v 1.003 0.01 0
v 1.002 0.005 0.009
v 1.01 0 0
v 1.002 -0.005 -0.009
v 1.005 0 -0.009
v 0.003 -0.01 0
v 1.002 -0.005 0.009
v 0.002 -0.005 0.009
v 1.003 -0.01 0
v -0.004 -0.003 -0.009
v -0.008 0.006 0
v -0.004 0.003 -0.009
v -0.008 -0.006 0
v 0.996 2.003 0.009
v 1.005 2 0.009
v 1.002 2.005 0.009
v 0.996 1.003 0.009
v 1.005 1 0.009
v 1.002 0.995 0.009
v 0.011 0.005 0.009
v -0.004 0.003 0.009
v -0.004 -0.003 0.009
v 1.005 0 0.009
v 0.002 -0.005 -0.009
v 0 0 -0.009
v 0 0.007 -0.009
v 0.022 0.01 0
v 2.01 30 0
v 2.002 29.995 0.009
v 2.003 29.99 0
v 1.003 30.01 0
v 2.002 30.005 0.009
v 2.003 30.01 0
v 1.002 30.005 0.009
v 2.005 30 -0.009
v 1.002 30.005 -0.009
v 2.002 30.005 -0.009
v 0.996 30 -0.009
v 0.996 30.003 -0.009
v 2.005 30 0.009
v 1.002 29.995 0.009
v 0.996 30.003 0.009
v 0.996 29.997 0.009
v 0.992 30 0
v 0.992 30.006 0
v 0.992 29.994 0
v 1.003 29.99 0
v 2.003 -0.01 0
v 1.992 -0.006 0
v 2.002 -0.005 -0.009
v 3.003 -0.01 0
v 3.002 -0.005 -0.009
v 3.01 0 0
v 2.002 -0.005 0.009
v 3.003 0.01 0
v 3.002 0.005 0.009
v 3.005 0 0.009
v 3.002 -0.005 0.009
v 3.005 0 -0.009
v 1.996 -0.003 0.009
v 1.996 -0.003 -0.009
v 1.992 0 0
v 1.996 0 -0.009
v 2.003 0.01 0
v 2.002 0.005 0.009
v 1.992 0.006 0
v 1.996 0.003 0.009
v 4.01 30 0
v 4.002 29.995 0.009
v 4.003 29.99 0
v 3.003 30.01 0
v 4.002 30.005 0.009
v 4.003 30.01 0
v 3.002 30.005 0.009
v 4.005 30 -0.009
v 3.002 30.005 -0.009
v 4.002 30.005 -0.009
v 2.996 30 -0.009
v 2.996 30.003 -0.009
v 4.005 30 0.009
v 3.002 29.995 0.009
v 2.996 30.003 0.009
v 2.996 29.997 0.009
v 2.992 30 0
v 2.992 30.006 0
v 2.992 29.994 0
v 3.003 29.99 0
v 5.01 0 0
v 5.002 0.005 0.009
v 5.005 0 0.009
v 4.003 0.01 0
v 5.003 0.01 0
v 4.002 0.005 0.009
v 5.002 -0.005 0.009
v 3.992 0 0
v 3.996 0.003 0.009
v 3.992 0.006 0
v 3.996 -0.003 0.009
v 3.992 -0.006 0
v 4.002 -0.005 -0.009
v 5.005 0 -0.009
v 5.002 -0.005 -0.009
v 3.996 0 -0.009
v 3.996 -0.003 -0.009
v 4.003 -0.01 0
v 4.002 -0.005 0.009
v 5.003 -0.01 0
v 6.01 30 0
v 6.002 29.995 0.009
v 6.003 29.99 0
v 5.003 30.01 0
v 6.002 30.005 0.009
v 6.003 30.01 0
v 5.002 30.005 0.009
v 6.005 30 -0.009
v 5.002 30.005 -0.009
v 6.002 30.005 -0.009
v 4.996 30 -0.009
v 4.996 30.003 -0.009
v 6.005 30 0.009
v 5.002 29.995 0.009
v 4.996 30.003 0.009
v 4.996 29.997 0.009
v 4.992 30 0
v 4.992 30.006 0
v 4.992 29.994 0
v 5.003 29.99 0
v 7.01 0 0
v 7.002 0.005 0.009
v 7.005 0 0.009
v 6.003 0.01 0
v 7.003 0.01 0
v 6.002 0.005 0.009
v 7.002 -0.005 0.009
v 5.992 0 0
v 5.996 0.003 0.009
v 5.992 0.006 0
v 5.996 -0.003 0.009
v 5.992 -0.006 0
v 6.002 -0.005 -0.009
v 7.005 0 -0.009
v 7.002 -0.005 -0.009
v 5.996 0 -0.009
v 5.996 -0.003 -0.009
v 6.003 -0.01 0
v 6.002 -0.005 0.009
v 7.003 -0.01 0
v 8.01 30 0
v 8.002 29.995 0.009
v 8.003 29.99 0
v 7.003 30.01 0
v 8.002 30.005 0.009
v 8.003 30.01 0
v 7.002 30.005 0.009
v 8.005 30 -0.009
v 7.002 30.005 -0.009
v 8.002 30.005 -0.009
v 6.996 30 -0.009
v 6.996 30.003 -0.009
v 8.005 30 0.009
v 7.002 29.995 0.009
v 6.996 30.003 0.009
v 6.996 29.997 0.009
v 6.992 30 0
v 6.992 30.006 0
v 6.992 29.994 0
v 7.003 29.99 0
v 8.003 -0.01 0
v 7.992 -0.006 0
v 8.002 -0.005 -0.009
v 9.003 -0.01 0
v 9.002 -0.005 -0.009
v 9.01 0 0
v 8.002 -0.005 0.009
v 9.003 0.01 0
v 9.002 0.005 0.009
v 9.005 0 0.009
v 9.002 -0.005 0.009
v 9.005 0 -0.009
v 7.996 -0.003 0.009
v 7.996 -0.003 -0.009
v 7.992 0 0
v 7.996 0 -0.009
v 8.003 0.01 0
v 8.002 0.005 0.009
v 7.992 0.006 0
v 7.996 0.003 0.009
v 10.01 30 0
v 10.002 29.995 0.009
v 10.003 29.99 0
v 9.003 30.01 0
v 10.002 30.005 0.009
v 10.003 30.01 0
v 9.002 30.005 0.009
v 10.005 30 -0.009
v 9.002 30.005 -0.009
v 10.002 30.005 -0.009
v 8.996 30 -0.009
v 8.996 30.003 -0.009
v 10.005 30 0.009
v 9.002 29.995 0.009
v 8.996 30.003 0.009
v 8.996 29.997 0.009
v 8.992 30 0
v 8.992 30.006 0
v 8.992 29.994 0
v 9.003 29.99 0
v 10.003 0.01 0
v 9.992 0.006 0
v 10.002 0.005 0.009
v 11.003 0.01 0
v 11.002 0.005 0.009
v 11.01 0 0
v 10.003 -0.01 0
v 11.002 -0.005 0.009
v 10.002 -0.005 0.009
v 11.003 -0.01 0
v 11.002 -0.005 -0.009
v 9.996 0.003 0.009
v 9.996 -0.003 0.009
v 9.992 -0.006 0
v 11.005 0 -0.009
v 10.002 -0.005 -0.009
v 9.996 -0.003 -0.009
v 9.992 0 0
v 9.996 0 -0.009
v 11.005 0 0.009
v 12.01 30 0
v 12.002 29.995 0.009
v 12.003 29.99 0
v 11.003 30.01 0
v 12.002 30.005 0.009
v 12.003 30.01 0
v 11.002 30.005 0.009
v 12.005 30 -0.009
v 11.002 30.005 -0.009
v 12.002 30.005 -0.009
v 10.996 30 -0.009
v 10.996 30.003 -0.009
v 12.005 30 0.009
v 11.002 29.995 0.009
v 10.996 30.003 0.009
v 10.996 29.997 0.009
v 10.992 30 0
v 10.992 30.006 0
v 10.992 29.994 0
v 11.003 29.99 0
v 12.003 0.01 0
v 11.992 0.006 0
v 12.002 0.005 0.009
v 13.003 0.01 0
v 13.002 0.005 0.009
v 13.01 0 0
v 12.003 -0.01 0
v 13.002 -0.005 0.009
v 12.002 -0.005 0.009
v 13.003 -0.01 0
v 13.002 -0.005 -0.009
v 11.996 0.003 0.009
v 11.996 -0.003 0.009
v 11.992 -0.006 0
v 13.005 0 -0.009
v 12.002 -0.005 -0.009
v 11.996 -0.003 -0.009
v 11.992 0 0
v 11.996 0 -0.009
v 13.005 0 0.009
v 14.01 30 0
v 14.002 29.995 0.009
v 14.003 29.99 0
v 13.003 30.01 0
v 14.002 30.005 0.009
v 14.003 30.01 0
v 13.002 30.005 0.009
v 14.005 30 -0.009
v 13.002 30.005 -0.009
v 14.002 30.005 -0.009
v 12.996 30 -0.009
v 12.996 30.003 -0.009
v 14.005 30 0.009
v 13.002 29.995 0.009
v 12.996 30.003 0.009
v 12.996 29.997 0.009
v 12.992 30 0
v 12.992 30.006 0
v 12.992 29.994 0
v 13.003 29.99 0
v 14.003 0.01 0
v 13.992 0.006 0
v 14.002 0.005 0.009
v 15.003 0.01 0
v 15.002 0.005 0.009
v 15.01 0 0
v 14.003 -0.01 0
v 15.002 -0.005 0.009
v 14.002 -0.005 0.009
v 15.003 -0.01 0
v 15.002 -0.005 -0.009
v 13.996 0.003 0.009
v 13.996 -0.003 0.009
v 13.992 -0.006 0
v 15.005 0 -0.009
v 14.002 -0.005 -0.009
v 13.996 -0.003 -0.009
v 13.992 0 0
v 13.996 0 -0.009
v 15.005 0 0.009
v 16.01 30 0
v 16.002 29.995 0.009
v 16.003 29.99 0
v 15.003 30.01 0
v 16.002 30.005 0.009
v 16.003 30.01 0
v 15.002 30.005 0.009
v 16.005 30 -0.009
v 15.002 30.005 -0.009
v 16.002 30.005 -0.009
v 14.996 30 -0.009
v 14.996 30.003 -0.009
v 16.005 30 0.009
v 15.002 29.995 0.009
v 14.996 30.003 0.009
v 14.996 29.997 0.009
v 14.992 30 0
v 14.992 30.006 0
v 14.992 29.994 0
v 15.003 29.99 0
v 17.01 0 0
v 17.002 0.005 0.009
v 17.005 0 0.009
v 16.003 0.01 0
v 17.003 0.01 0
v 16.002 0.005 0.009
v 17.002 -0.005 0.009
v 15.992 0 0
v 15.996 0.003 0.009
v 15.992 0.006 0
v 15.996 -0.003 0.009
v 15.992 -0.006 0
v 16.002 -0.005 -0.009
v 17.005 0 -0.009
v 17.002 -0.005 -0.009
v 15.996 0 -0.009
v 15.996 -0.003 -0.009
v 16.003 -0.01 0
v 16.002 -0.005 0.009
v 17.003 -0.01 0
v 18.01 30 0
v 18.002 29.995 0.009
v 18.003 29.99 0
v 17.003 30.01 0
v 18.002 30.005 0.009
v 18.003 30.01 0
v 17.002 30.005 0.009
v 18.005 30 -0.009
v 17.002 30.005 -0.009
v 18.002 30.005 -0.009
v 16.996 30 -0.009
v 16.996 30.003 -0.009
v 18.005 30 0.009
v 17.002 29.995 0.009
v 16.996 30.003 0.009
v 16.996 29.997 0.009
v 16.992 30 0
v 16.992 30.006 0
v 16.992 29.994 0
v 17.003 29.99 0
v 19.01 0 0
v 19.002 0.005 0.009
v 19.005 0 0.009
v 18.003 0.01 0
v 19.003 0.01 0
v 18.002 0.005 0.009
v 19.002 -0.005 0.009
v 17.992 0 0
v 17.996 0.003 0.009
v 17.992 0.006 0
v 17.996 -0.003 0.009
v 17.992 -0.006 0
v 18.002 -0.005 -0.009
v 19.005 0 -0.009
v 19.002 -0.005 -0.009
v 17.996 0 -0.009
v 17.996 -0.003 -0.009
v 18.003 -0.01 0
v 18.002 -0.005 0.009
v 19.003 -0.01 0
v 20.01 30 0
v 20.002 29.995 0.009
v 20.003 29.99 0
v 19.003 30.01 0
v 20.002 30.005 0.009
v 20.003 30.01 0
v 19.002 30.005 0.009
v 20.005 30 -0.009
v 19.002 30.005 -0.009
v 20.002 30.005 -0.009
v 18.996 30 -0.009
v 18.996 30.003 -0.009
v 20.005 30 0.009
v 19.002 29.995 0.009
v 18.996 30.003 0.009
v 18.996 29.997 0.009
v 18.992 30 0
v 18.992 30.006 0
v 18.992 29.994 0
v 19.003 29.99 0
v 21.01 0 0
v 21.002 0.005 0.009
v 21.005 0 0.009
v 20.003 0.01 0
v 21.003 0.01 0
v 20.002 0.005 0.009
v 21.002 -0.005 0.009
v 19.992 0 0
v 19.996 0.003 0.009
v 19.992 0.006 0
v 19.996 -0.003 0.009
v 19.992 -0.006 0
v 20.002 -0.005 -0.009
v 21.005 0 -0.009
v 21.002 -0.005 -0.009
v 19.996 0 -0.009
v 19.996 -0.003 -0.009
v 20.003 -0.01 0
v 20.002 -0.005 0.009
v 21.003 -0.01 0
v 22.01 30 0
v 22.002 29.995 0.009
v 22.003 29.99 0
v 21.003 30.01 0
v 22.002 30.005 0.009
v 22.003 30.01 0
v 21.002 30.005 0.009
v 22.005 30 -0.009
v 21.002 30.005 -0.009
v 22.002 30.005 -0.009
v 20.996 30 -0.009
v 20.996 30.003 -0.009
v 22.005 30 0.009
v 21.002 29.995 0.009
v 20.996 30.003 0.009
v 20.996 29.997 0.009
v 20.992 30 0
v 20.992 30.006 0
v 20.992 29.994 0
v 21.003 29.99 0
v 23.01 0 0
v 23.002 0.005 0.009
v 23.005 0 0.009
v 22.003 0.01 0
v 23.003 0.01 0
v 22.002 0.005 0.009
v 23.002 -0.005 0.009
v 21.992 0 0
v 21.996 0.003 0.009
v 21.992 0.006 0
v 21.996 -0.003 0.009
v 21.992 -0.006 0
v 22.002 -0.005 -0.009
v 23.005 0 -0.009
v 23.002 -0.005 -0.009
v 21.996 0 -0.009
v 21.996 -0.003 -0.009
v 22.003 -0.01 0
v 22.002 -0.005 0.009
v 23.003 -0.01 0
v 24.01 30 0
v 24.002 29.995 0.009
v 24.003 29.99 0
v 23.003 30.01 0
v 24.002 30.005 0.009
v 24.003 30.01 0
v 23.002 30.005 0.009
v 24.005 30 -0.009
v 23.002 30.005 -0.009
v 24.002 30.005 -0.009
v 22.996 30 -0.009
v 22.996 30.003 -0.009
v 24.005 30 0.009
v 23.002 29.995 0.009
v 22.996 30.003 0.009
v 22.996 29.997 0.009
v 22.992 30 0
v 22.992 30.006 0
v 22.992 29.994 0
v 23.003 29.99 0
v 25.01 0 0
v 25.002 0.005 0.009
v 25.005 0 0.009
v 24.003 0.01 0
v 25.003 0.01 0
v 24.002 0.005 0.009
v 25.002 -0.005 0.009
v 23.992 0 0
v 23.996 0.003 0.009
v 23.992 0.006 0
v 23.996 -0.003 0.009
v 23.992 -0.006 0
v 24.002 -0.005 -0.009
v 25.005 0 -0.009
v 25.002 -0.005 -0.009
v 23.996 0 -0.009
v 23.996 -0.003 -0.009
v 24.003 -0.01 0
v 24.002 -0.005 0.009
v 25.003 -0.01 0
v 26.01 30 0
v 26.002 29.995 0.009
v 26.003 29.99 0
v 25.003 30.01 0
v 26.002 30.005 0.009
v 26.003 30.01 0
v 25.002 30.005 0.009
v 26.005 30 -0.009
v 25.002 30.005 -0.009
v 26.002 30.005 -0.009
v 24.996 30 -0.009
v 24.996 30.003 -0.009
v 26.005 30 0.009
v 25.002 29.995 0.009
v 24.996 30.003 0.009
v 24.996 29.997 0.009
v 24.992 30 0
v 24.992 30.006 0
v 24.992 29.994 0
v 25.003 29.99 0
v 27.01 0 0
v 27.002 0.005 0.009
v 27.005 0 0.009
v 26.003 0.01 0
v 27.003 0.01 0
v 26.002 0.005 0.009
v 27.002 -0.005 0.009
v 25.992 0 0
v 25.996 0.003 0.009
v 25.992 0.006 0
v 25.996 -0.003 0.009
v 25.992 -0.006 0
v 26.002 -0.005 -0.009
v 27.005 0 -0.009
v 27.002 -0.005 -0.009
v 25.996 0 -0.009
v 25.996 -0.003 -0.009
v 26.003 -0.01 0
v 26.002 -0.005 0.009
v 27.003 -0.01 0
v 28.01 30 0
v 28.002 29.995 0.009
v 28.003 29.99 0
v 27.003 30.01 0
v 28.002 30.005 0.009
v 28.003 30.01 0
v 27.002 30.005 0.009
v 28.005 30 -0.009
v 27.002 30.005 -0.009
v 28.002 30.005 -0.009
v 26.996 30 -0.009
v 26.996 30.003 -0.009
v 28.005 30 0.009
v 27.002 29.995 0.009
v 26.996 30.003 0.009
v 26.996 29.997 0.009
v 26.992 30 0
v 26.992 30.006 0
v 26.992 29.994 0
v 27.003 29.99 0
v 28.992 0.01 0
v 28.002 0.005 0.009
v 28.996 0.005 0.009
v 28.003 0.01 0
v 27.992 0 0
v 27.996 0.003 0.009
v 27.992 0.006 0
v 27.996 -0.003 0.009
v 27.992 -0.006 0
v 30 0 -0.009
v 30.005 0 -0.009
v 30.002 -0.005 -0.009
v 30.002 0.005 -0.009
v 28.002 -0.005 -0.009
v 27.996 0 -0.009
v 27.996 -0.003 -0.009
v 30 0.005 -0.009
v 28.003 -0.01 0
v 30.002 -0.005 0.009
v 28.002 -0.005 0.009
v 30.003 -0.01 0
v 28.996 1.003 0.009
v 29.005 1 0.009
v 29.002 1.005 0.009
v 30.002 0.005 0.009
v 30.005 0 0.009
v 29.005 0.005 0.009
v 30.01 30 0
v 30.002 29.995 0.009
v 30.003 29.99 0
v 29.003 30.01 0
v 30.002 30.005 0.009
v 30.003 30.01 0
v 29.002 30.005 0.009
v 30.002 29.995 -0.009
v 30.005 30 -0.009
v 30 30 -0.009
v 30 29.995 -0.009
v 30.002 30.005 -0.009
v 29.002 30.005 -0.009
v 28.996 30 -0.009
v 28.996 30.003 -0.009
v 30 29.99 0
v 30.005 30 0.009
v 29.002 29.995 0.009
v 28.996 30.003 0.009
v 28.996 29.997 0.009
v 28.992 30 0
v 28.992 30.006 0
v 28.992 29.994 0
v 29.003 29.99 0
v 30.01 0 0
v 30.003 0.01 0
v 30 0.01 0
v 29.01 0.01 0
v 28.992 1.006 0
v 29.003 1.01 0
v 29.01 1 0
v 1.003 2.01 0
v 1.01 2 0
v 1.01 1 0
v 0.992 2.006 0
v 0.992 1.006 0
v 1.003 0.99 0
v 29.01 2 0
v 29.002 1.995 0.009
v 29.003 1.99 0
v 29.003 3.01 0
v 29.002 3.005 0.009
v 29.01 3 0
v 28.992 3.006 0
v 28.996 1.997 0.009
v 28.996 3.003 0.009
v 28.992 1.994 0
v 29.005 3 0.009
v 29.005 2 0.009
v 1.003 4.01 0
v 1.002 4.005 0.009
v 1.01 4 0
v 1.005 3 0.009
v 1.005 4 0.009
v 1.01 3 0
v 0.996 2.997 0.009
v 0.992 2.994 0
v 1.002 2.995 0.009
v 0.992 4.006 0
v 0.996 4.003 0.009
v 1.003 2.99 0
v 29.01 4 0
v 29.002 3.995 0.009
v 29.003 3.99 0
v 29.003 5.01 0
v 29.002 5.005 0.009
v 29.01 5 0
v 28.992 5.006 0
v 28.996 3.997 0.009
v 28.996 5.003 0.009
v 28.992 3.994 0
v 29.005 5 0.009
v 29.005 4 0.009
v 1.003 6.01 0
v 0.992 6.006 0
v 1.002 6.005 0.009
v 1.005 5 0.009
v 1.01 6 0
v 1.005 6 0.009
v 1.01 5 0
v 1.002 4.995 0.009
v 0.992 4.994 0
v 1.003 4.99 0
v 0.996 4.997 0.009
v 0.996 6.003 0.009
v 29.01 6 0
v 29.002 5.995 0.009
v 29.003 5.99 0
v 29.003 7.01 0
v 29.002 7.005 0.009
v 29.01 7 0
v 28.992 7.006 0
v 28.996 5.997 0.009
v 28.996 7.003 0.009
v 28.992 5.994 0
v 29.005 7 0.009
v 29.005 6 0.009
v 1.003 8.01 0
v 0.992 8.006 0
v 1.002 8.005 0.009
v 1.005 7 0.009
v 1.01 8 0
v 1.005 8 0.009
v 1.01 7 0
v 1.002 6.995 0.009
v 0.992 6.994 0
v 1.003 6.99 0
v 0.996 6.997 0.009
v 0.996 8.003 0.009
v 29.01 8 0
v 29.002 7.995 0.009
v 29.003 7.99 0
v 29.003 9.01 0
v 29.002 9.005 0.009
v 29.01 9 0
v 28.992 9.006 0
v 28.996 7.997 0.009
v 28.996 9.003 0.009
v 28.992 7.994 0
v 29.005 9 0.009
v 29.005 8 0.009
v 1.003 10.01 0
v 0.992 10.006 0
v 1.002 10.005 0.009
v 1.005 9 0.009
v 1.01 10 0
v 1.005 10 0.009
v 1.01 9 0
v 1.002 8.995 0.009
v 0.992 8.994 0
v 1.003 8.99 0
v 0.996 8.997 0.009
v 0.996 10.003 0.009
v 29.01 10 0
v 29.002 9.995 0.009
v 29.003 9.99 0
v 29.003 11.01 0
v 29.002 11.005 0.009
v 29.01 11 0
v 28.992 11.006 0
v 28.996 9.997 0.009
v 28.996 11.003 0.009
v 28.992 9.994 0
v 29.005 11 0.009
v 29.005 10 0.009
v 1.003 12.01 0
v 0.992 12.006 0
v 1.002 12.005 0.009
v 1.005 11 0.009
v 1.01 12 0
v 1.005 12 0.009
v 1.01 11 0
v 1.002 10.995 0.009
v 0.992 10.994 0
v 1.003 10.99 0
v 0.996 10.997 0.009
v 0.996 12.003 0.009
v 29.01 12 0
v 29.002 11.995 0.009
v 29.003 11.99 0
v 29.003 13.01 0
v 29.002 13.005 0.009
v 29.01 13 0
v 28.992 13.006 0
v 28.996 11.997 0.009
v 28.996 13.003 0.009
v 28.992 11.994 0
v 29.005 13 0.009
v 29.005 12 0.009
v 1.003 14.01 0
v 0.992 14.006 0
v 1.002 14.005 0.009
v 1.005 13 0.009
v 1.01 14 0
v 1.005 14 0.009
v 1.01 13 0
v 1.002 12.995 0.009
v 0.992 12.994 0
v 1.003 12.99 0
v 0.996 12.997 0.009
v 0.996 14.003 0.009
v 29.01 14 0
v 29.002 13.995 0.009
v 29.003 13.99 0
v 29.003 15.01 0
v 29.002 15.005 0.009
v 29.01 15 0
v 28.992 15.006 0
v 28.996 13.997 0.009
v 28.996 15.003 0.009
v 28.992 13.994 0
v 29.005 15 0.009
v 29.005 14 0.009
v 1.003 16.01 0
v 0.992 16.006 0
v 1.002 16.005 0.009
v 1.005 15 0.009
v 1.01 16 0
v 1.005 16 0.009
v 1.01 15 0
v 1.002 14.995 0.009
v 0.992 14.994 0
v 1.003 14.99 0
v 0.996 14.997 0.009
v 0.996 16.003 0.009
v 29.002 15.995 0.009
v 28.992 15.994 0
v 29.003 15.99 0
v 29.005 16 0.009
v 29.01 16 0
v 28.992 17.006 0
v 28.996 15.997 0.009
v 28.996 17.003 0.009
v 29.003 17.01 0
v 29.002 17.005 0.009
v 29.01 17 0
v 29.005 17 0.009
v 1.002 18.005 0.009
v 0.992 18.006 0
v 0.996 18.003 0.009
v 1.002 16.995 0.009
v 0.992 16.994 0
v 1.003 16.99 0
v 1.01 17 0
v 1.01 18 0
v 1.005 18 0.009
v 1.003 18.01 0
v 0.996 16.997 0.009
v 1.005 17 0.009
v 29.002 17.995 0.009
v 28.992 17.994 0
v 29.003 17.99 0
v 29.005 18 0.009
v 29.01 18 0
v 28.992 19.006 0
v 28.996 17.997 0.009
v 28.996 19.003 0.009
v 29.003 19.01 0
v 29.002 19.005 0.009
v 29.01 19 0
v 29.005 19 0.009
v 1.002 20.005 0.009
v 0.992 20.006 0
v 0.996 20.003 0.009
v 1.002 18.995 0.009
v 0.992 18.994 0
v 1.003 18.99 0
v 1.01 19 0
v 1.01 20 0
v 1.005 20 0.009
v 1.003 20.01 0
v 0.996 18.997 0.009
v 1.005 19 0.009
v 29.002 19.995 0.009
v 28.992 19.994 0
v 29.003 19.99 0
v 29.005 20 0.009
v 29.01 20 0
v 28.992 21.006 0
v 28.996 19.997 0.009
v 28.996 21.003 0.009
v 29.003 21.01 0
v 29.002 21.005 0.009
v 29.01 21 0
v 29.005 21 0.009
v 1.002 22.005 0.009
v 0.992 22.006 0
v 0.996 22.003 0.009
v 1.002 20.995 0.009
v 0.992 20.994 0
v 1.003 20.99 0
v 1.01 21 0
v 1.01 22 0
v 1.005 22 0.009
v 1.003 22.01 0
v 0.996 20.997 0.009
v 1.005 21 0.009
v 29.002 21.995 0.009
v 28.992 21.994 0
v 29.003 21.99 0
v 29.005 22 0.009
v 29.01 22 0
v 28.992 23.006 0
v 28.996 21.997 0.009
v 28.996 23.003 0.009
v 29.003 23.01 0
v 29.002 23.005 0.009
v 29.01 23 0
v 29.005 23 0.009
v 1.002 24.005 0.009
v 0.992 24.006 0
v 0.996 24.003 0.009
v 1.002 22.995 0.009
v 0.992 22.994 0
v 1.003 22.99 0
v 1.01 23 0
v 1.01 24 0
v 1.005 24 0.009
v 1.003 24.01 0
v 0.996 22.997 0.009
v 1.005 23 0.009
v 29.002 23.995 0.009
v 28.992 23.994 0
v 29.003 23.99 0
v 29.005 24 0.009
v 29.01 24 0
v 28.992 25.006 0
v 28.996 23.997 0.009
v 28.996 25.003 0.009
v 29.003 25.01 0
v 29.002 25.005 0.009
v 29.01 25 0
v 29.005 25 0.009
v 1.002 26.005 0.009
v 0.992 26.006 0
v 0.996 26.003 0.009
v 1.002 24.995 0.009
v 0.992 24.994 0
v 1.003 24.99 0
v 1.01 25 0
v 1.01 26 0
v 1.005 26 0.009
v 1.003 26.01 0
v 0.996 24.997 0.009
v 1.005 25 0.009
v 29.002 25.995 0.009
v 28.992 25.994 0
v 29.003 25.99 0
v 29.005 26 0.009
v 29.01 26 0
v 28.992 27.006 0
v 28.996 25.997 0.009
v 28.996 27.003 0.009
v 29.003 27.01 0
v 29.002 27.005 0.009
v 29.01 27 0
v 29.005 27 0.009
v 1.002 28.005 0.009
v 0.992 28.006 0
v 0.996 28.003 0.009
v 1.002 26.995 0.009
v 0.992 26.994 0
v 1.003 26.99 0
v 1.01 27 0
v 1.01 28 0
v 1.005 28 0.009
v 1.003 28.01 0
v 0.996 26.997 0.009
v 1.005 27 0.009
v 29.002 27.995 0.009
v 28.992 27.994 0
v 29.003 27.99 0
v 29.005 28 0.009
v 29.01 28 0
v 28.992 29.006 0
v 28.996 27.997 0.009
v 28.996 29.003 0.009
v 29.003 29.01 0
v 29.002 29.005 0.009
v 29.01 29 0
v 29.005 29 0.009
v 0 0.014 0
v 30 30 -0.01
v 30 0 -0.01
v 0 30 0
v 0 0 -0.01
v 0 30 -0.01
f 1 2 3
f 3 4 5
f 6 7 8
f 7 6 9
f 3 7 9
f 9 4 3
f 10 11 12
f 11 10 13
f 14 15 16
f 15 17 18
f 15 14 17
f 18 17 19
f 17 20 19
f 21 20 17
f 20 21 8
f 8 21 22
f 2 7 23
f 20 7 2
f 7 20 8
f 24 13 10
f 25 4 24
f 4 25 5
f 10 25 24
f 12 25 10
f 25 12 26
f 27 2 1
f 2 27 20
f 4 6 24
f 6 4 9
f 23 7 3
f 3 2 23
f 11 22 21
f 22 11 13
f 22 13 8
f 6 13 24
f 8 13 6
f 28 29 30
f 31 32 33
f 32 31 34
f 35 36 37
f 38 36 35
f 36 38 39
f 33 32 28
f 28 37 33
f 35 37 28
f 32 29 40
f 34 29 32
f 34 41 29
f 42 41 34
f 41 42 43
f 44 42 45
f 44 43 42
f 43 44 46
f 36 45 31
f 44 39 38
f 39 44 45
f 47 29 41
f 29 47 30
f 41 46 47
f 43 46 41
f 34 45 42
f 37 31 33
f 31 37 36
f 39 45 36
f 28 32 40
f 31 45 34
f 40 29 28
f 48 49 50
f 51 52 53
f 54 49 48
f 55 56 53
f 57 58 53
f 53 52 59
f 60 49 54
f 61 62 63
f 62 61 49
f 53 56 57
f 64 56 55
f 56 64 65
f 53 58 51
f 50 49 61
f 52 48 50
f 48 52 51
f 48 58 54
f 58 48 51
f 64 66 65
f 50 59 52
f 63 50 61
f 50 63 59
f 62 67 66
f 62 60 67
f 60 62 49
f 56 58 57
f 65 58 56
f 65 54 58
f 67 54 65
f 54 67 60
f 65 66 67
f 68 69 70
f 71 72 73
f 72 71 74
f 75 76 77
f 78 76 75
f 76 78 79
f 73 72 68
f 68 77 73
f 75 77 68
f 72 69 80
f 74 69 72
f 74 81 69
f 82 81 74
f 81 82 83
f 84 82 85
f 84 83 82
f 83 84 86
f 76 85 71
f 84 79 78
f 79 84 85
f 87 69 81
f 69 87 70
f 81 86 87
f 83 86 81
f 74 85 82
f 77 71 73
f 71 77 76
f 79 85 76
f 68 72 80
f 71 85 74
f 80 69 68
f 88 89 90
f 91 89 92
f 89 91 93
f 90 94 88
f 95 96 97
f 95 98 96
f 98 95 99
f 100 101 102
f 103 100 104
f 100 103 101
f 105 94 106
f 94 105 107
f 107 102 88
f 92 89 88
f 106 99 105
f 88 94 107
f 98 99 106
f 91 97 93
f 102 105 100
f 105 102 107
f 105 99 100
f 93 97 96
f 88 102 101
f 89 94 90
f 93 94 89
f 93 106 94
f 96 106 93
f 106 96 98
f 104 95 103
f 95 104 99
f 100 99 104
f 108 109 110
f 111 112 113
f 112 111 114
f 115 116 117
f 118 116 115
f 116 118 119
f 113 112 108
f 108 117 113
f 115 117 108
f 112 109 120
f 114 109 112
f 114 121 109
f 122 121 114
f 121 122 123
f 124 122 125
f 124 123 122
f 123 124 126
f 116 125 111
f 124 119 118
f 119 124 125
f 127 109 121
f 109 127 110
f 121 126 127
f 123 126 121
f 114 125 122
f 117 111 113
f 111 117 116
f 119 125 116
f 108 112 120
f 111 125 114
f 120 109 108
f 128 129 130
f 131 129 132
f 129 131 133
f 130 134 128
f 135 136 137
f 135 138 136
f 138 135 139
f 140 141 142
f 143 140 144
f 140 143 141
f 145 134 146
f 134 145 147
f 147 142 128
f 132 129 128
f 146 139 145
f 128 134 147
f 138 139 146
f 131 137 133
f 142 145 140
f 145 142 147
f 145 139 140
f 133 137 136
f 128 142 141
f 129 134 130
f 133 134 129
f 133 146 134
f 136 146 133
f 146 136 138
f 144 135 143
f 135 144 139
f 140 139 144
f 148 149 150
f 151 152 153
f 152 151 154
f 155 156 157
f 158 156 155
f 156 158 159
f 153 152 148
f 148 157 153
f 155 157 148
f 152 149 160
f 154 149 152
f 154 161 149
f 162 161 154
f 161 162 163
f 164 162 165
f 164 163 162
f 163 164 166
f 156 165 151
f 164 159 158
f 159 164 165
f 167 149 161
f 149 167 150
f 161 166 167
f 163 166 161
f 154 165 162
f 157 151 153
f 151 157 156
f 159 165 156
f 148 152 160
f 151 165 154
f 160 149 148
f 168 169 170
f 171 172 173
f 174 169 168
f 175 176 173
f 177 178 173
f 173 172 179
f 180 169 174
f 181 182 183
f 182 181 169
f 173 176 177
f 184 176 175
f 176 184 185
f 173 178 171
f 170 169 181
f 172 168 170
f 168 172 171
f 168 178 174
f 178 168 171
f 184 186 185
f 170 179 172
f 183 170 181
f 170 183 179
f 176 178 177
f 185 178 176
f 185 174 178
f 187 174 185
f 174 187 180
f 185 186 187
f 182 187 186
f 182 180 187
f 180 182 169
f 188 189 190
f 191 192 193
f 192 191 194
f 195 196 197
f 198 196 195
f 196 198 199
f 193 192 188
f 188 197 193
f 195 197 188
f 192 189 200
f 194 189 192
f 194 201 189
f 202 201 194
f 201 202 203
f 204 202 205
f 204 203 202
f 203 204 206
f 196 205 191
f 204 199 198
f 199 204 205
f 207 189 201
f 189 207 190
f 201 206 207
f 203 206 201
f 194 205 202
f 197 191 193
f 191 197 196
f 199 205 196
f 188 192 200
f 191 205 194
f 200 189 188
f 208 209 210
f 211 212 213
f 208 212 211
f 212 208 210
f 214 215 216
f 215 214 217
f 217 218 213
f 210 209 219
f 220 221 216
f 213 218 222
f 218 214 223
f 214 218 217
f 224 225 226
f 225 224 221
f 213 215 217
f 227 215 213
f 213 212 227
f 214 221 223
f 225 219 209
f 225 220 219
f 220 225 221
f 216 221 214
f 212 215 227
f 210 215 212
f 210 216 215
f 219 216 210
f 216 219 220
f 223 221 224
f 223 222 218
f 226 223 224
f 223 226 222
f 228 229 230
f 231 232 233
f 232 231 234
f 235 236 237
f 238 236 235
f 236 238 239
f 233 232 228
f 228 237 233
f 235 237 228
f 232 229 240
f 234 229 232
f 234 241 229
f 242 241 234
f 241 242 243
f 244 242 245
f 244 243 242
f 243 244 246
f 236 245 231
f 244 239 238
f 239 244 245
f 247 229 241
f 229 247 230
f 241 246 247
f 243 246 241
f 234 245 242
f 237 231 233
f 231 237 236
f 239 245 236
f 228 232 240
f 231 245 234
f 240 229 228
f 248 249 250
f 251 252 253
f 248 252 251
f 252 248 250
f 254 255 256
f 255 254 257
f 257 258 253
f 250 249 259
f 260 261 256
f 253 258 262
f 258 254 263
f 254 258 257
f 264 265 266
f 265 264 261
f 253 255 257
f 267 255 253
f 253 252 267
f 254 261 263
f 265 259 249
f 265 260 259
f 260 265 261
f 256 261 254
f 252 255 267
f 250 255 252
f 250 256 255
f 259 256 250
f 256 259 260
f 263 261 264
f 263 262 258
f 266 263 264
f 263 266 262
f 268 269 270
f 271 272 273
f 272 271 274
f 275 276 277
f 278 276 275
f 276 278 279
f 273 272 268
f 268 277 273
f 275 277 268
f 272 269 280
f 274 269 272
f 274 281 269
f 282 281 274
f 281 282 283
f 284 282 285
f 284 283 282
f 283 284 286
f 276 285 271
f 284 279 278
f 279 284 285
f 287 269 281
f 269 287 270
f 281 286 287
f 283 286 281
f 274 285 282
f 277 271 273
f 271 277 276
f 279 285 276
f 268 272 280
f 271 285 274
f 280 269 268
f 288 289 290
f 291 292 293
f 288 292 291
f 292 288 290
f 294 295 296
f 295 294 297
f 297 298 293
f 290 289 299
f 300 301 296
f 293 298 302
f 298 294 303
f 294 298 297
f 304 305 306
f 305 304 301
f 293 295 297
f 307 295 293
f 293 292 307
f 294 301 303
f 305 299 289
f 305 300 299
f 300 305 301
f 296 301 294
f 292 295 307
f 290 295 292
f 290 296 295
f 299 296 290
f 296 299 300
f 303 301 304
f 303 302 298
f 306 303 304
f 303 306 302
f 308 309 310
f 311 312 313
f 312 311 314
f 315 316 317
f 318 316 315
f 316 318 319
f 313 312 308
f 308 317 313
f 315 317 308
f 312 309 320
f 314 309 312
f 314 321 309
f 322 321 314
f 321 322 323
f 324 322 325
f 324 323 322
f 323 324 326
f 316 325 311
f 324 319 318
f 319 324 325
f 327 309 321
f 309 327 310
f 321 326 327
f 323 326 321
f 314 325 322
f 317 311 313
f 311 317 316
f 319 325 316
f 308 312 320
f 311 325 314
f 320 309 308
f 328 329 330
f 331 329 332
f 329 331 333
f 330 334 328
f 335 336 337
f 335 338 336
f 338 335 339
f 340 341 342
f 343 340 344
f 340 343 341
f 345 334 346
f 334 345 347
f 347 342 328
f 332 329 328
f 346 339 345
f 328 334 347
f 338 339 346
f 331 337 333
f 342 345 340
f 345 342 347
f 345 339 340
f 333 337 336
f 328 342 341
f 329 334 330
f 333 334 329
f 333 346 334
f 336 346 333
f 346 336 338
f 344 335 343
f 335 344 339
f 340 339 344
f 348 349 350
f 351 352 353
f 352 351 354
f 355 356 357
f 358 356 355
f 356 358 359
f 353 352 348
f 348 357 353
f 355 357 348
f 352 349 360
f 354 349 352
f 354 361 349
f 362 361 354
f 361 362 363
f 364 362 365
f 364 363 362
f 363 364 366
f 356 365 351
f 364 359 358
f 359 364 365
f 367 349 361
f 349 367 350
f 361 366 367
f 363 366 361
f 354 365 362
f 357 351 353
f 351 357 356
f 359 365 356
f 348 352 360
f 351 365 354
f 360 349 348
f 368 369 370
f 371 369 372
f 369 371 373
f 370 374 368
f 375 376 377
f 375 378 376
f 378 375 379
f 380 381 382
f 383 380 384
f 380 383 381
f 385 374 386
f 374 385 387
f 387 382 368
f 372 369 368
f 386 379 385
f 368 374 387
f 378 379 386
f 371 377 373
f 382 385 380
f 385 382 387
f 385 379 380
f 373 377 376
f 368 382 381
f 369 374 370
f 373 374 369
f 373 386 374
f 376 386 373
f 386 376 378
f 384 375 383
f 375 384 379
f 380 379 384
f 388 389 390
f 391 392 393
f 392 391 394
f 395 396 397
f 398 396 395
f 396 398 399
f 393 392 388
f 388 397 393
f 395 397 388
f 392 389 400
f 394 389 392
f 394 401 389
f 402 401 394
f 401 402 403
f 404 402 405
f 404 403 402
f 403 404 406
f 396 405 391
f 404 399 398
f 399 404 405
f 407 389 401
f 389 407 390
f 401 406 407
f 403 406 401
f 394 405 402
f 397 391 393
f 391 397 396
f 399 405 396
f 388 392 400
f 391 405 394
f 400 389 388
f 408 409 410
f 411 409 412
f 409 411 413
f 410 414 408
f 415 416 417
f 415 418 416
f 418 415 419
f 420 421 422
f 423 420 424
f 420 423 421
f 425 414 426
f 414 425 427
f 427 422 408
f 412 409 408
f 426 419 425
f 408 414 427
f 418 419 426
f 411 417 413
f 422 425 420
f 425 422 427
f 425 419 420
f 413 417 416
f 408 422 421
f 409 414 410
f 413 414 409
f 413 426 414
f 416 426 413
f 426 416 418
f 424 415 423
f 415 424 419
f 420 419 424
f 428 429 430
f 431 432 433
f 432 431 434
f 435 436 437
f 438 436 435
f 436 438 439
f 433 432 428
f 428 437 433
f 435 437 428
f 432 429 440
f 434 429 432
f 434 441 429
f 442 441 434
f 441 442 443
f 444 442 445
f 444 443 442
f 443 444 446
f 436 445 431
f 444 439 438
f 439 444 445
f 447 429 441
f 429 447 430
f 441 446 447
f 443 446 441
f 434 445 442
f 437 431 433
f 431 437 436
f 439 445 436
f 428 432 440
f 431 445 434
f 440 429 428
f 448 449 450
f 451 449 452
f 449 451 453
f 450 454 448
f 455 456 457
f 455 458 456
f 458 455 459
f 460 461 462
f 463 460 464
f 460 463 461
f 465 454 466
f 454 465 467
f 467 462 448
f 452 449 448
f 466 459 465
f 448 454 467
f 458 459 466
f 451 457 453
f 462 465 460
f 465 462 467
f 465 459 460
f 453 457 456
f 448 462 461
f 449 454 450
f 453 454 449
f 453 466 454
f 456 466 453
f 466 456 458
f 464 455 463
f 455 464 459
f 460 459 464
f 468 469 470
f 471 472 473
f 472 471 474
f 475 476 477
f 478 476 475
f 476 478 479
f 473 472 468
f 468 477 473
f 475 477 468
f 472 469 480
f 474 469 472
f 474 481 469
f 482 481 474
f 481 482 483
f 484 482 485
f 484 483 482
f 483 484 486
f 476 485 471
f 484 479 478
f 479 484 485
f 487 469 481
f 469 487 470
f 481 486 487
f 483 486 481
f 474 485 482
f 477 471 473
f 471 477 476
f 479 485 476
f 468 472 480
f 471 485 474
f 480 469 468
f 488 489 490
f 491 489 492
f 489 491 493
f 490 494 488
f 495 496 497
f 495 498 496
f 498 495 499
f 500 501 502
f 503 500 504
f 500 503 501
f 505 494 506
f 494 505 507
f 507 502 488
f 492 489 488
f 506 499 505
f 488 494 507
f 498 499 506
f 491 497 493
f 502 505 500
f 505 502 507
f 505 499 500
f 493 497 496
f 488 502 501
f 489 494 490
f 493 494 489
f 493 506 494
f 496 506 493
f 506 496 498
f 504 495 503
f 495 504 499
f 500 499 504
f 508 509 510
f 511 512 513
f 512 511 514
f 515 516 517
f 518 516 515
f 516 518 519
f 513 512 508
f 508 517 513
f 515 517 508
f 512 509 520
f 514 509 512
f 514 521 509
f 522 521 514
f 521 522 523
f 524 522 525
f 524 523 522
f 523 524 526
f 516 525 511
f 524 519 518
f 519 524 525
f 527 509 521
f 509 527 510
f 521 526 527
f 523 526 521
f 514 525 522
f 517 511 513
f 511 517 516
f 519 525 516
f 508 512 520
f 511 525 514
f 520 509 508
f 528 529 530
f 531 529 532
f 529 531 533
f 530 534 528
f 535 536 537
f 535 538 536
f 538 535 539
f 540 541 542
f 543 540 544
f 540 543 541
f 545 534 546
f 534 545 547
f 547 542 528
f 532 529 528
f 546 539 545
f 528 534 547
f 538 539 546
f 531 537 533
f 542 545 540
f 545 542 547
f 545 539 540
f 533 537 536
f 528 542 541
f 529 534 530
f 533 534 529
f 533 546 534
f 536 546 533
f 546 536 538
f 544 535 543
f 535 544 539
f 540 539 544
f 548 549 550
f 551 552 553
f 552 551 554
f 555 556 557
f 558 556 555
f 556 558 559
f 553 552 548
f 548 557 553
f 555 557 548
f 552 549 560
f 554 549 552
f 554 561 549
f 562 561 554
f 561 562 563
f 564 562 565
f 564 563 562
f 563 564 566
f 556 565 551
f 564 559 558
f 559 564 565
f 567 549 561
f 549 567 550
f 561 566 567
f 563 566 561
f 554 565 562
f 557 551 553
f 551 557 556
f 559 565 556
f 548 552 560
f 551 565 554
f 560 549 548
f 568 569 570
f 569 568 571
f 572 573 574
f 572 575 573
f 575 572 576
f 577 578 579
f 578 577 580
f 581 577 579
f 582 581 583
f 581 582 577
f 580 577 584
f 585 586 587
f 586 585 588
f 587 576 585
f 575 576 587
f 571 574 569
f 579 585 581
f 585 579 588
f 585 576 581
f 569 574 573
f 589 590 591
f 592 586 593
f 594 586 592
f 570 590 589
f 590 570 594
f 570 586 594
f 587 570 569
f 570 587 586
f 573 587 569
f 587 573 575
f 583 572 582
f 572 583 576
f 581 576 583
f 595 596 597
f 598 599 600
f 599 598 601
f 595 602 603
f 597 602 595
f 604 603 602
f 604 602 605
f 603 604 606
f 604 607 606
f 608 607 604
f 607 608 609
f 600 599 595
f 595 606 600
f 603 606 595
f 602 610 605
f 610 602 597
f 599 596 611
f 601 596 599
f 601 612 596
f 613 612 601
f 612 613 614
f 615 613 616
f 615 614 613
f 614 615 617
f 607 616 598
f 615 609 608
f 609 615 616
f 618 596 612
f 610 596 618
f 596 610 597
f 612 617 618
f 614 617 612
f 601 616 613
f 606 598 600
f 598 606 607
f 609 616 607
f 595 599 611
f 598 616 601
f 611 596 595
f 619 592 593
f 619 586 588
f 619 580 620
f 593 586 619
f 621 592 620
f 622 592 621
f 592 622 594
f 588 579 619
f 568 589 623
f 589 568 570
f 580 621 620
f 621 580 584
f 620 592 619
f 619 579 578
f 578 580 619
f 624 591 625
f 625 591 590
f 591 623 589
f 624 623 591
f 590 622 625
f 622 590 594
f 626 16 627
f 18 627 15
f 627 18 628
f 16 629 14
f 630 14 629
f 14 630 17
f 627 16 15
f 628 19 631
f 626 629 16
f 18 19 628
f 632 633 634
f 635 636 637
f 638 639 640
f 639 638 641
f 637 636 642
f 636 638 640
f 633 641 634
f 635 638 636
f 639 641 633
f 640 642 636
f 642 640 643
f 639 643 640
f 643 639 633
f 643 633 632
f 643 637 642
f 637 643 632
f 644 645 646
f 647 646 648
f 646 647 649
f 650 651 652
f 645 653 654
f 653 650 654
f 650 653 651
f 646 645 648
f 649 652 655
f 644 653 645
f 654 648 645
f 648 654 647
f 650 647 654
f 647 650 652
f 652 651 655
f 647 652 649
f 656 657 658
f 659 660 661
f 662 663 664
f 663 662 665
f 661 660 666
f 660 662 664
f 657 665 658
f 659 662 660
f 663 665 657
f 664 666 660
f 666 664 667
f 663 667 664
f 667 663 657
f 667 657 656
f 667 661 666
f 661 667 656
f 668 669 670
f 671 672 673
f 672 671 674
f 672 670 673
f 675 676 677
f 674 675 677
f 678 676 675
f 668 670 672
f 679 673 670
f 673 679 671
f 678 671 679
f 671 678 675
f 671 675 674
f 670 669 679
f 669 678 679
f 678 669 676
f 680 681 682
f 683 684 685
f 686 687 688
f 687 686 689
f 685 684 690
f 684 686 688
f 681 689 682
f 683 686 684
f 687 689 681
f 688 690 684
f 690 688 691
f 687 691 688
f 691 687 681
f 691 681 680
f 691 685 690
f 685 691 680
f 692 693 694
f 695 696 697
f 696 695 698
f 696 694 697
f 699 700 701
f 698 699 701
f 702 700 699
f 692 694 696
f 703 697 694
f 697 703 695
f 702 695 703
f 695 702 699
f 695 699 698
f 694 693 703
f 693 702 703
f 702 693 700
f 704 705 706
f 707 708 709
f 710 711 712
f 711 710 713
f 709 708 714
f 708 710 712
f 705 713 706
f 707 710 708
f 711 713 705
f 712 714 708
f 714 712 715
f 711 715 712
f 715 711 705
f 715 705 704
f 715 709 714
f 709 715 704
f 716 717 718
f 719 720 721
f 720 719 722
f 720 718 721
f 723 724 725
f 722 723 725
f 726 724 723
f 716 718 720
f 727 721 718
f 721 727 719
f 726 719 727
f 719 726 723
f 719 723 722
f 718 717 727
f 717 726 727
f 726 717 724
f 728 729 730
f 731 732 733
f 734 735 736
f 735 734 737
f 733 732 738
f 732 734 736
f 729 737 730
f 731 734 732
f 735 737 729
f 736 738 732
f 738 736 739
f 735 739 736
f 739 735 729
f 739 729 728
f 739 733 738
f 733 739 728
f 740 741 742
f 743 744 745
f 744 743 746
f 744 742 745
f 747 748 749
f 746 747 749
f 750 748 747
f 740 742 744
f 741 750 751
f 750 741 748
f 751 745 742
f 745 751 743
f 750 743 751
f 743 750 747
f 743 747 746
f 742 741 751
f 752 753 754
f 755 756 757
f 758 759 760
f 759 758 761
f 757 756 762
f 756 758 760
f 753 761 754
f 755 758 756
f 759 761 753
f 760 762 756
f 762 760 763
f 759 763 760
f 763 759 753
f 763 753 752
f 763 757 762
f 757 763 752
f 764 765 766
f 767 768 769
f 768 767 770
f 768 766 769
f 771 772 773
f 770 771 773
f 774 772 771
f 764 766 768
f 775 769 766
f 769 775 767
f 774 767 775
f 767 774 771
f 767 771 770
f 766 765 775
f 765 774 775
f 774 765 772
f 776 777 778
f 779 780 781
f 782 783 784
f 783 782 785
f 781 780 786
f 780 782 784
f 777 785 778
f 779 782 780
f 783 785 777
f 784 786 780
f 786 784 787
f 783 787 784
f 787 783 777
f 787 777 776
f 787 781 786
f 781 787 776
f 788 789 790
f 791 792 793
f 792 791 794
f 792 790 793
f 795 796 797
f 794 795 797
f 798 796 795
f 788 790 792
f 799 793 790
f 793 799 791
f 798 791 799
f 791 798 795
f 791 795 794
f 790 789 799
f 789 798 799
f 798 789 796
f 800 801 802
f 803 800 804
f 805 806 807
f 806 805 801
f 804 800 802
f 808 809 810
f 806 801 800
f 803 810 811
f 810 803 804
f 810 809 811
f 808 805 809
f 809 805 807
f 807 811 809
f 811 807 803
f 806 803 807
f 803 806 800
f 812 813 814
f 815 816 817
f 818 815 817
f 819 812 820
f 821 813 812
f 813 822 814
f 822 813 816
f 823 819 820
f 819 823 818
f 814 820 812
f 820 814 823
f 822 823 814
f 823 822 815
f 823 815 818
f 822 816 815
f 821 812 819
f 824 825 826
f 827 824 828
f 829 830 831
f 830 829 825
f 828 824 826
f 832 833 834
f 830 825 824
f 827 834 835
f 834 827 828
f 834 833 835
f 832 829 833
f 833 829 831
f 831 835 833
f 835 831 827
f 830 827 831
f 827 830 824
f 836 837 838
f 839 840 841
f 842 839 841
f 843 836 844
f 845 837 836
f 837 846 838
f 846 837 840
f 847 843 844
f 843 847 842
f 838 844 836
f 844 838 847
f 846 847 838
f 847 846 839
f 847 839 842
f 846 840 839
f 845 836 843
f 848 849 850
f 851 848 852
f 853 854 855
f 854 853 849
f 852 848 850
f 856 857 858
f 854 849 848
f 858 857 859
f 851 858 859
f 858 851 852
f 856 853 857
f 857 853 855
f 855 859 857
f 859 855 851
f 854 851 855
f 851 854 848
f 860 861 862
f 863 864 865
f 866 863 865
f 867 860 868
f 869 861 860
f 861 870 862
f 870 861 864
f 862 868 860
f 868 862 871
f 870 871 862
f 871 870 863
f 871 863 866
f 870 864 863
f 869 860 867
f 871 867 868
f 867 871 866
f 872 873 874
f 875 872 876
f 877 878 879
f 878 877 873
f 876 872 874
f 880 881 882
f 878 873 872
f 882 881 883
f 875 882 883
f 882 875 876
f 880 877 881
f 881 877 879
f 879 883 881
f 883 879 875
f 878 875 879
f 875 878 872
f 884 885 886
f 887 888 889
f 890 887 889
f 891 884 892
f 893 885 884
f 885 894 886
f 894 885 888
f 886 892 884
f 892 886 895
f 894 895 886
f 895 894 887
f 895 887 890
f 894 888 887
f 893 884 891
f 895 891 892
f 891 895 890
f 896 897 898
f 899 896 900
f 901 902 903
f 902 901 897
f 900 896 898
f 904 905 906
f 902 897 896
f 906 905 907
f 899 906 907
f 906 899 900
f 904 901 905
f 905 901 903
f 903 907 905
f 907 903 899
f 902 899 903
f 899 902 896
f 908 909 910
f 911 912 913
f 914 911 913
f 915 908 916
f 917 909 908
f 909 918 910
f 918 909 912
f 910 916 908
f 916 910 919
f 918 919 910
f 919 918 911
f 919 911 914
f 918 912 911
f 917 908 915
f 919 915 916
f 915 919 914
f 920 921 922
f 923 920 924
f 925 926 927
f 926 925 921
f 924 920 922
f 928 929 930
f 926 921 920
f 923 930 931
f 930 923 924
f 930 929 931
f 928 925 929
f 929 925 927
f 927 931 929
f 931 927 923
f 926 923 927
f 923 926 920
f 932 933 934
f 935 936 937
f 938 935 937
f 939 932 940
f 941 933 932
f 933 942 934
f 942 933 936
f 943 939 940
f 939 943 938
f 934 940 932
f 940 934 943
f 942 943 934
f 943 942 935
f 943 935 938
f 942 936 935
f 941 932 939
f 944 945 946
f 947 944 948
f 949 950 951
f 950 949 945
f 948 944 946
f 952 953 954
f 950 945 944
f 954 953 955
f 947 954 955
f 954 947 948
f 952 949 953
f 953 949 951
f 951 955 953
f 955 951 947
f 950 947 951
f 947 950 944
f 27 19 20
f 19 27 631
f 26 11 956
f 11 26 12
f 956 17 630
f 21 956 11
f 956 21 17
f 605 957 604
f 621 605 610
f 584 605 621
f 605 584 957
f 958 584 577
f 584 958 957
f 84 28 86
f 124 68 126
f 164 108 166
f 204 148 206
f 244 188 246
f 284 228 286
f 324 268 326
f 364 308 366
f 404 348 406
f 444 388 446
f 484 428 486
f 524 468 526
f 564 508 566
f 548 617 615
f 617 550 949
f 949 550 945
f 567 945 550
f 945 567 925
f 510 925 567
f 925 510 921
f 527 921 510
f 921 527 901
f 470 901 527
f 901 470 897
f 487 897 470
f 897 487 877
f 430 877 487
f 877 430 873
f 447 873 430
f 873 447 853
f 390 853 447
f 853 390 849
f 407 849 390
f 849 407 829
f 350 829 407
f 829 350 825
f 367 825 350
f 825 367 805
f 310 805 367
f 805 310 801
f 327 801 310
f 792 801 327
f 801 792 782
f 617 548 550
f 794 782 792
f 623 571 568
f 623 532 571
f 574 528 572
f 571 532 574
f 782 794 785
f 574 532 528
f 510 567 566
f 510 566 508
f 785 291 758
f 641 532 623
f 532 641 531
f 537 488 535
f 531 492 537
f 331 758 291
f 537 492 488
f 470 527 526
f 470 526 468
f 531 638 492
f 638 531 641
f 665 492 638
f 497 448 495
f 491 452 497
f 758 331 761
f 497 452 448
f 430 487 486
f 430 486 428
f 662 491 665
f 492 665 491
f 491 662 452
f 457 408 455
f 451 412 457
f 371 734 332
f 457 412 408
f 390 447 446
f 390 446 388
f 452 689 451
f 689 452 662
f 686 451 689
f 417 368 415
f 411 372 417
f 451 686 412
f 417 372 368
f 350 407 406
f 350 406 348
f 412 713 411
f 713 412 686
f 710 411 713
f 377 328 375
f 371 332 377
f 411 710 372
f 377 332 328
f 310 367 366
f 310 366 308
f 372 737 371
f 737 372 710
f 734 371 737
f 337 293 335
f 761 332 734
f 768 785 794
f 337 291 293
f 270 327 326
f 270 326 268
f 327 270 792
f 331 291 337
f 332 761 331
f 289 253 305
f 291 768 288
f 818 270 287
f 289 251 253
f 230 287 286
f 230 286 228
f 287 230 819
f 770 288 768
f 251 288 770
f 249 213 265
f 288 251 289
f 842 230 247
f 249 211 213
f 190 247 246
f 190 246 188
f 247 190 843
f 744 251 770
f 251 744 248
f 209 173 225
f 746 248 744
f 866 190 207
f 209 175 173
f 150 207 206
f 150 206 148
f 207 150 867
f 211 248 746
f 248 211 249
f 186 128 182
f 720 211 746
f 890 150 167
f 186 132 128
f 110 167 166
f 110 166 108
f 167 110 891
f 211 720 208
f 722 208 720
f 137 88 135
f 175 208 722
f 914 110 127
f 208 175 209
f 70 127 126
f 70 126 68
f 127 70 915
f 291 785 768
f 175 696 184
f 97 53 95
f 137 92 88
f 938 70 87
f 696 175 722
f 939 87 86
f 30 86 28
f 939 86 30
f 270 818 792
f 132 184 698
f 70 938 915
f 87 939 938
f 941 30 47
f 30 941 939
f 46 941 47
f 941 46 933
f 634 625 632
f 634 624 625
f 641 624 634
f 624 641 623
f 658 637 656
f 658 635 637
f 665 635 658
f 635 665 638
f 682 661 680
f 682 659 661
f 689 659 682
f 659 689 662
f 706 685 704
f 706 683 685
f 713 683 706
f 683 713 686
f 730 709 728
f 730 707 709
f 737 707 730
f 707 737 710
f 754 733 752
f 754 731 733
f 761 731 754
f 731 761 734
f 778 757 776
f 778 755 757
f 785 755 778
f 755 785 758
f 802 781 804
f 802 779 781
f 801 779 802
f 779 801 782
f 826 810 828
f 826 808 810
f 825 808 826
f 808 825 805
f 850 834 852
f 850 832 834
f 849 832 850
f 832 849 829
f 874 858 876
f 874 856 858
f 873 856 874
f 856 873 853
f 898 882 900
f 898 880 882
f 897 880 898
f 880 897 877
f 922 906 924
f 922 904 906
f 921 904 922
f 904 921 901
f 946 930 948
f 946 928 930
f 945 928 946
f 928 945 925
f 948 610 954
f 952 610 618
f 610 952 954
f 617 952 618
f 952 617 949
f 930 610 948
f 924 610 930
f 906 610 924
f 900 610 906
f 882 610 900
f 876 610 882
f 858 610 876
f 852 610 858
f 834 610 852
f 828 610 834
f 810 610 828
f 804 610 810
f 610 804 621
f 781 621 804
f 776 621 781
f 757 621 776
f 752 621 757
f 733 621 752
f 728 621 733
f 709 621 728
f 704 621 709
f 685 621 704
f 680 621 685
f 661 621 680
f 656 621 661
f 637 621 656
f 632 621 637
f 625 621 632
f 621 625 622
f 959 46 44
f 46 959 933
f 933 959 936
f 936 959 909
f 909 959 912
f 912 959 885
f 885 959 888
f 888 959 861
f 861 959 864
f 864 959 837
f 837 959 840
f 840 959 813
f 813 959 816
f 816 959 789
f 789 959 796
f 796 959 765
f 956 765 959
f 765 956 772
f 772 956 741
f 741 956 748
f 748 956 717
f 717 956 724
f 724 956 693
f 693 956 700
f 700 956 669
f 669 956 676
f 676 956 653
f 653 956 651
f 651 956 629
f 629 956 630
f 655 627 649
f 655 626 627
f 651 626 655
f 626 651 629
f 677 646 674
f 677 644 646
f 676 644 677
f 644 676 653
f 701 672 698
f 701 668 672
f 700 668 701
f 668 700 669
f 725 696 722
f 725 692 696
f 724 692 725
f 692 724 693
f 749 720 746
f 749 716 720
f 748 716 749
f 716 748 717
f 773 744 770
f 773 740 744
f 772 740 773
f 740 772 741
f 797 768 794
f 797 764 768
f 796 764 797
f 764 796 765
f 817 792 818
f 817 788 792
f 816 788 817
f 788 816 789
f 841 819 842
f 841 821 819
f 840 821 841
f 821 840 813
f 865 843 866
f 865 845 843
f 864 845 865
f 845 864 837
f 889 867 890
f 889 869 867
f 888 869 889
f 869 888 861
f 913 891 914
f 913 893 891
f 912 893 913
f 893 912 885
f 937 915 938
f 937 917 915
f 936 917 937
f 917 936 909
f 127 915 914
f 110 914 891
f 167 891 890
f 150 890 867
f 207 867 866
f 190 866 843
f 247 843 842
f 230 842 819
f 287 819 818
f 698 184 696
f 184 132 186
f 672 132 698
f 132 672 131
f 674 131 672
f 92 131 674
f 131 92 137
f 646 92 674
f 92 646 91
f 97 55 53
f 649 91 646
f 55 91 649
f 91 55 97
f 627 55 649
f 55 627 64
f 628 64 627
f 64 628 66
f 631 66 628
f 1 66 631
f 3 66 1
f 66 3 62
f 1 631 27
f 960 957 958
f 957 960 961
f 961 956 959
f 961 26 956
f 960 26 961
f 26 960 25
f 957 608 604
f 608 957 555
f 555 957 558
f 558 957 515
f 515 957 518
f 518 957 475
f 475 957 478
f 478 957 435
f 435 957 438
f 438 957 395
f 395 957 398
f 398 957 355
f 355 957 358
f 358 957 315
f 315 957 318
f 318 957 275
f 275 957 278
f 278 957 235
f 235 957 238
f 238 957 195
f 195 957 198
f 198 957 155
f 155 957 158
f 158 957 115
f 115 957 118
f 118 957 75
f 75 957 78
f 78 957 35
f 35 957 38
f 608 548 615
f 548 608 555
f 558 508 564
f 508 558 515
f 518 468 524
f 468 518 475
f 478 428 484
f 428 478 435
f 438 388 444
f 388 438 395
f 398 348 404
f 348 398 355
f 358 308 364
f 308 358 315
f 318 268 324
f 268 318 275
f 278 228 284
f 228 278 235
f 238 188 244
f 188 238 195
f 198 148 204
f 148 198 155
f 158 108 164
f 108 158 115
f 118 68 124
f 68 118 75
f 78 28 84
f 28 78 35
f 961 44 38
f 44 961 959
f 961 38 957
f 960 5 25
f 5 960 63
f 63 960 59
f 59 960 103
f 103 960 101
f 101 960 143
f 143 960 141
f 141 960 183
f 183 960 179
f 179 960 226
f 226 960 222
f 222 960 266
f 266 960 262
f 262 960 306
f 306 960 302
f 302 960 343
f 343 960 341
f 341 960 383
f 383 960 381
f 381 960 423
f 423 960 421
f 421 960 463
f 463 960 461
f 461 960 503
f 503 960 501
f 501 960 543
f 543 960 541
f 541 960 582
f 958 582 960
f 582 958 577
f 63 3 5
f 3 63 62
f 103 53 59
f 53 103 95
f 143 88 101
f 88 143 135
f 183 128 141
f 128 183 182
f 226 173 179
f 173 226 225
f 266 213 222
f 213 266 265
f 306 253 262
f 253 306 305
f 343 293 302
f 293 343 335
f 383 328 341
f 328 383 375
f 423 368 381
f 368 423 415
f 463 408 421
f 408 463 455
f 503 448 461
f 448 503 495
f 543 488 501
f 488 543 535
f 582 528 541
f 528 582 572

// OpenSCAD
hull(){
    translate([0, 0]) sphere(0.01);
    translate([1, 0]) sphere(0.01);
}
hull(){
    translate([1, 30]) sphere(0.01);
    translate([2, 30]) sphere(0.01);
}
hull(){
    translate([2, 0]) sphere(0.01);
    translate([3, 0]) sphere(0.01);
}
hull(){
    translate([3, 30]) sphere(0.01);
    translate([4, 30]) sphere(0.01);
}
hull(){
    translate([4, 0]) sphere(0.01);
    translate([5, 0]) sphere(0.01);
}
hull(){
    translate([5, 30]) sphere(0.01);
    translate([6, 30]) sphere(0.01);
}
hull(){
    translate([6, 0]) sphere(0.01);
    translate([7, 0]) sphere(0.01);
}
hull(){
    translate([7, 30]) sphere(0.01);
    translate([8, 30]) sphere(0.01);
}
hull(){
    translate([8, 0]) sphere(0.01);
    translate([9, 0]) sphere(0.01);
}
hull(){
    translate([9, 30]) sphere(0.01);
    translate([10, 30]) sphere(0.01);
}
hull(){
    translate([10, 0]) sphere(0.01);
    translate([11, 0]) sphere(0.01);
}
hull(){
    translate([11, 30]) sphere(0.01);
    translate([12, 30]) sphere(0.01);
}
hull(){
    translate([12, 0]) sphere(0.01);
    translate([13, 0]) sphere(0.01);
}
hull(){
    translate([13, 30]) sphere(0.01);
    translate([14, 30]) sphere(0.01);
}
hull(){
    translate([14, 0]) sphere(0.01);
    translate([15, 0]) sphere(0.01);
}
hull(){
    translate([15, 30]) sphere(0.01);
    translate([16, 30]) sphere(0.01);
}
hull(){
    translate([16, 0]) sphere(0.01);
    translate([17, 0]) sphere(0.01);
}
hull(){
    translate([17, 30]) sphere(0.01);
    translate([18, 30]) sphere(0.01);
}
hull(){
    translate([18, 0]) sphere(0.01);
    translate([19, 0]) sphere(0.01);
}
hull(){
    translate([19, 30]) sphere(0.01);
    translate([20, 30]) sphere(0.01);
}
hull(){
    translate([20, 0]) sphere(0.01);
    translate([21, 0]) sphere(0.01);
}
hull(){
    translate([21, 30]) sphere(0.01);
    translate([22, 30]) sphere(0.01);
}
hull(){
    translate([22, 0]) sphere(0.01);
    translate([23, 0]) sphere(0.01);
}
hull(){
    translate([23, 30]) sphere(0.01);
    translate([24, 30]) sphere(0.01);
}
hull(){
    translate([24, 0]) sphere(0.01);
    translate([25, 0]) sphere(0.01);
}
hull(){
    translate([25, 30]) sphere(0.01);
    translate([26, 30]) sphere(0.01);
}
hull(){
    translate([26, 0]) sphere(0.01);
    translate([27, 0]) sphere(0.01);
}
hull(){
    translate([27, 30]) sphere(0.01);
    translate([28, 30]) sphere(0.01);
}
hull(){
    translate([28, 0]) sphere(0.01);
    translate([29, 0]) sphere(0.01);
}
hull(){
    translate([29, 30]) sphere(0.01);
    translate([30, 30]) sphere(0.01);
}
hull(){
    translate([30, 0]) sphere(0.01);
    translate([29, 0]) sphere(0.01);
}
hull(){
    translate([29, 0]) sphere(0.01);
    translate([29, 1]) sphere(0.01);
}
hull(){
    translate([1, 1]) sphere(0.01);
    translate([1, 2]) sphere(0.01);
}
hull(){
    translate([29, 2]) sphere(0.01);
    translate([29, 3]) sphere(0.01);
}
hull(){
    translate([1, 3]) sphere(0.01);
    translate([1, 4]) sphere(0.01);
}
hull(){
    translate([29, 4]) sphere(0.01);
    translate([29, 5]) sphere(0.01);
}
hull(){
    translate([1, 5]) sphere(0.01);
    translate([1, 6]) sphere(0.01);
}
hull(){
    translate([29, 6]) sphere(0.01);
    translate([29, 7]) sphere(0.01);
}
hull(){
    translate([1, 7]) sphere(0.01);
    translate([1, 8]) sphere(0.01);
}
hull(){
    translate([29, 8]) sphere(0.01);
    translate([29, 9]) sphere(0.01);
}
hull(){
    translate([1, 9]) sphere(0.01);
    translate([1, 10]) sphere(0.01);
}
hull(){
    translate([29, 10]) sphere(0.01);
    translate([29, 11]) sphere(0.01);
}
hull(){
    translate([1, 11]) sphere(0.01);
    translate([1, 12]) sphere(0.01);
}
hull(){
    translate([29, 12]) sphere(0.01);
    translate([29, 13]) sphere(0.01);
}
hull(){
    translate([1, 13]) sphere(0.01);
    translate([1, 14]) sphere(0.01);
}
hull(){
    translate([29, 14]) sphere(0.01);
    translate([29, 15]) sphere(0.01);
}
hull(){
    translate([1, 15]) sphere(0.01);
    translate([1, 16]) sphere(0.01);
}
hull(){
    translate([29, 16]) sphere(0.01);
    translate([29, 17]) sphere(0.01);
}
hull(){
    translate([1, 17]) sphere(0.01);
    translate([1, 18]) sphere(0.01);
}
hull(){
    translate([29, 18]) sphere(0.01);
    translate([29, 19]) sphere(0.01);
}
hull(){
    translate([1, 19]) sphere(0.01);
    translate([1, 20]) sphere(0.01);
}
hull(){
    translate([29, 20]) sphere(0.01);
    translate([29, 21]) sphere(0.01);
}
hull(){
    translate([1, 21]) sphere(0.01);
    translate([1, 22]) sphere(0.01);
}
hull(){
    translate([29, 22]) sphere(0.01);
    translate([29, 23]) sphere(0.01);
}
hull(){
    translate([1, 23]) sphere(0.01);
    translate([1, 24]) sphere(0.01);
}
hull(){
    translate([29, 24]) sphere(0.01);
    translate([29, 25]) sphere(0.01);
}
hull(){
    translate([1, 25]) sphere(0.01);
    translate([1, 26]) sphere(0.01);
}
hull(){
    translate([29, 26]) sphere(0.01);
    translate([29, 27]) sphere(0.01);
}
hull(){
    translate([1, 27]) sphere(0.01);
    translate([1, 28]) sphere(0.01);
}
hull(){
    translate([29, 28]) sphere(0.01);
    translate([29, 29]) sphere(0.01);
}
hull(){
    translate([1, 1]) sphere(0.01);
    translate([0, 0]) sphere(0.01);
}
translate([0,0,-0.01]) color([0.1,0.1,0.1]) cube([30,30,0.01]);
